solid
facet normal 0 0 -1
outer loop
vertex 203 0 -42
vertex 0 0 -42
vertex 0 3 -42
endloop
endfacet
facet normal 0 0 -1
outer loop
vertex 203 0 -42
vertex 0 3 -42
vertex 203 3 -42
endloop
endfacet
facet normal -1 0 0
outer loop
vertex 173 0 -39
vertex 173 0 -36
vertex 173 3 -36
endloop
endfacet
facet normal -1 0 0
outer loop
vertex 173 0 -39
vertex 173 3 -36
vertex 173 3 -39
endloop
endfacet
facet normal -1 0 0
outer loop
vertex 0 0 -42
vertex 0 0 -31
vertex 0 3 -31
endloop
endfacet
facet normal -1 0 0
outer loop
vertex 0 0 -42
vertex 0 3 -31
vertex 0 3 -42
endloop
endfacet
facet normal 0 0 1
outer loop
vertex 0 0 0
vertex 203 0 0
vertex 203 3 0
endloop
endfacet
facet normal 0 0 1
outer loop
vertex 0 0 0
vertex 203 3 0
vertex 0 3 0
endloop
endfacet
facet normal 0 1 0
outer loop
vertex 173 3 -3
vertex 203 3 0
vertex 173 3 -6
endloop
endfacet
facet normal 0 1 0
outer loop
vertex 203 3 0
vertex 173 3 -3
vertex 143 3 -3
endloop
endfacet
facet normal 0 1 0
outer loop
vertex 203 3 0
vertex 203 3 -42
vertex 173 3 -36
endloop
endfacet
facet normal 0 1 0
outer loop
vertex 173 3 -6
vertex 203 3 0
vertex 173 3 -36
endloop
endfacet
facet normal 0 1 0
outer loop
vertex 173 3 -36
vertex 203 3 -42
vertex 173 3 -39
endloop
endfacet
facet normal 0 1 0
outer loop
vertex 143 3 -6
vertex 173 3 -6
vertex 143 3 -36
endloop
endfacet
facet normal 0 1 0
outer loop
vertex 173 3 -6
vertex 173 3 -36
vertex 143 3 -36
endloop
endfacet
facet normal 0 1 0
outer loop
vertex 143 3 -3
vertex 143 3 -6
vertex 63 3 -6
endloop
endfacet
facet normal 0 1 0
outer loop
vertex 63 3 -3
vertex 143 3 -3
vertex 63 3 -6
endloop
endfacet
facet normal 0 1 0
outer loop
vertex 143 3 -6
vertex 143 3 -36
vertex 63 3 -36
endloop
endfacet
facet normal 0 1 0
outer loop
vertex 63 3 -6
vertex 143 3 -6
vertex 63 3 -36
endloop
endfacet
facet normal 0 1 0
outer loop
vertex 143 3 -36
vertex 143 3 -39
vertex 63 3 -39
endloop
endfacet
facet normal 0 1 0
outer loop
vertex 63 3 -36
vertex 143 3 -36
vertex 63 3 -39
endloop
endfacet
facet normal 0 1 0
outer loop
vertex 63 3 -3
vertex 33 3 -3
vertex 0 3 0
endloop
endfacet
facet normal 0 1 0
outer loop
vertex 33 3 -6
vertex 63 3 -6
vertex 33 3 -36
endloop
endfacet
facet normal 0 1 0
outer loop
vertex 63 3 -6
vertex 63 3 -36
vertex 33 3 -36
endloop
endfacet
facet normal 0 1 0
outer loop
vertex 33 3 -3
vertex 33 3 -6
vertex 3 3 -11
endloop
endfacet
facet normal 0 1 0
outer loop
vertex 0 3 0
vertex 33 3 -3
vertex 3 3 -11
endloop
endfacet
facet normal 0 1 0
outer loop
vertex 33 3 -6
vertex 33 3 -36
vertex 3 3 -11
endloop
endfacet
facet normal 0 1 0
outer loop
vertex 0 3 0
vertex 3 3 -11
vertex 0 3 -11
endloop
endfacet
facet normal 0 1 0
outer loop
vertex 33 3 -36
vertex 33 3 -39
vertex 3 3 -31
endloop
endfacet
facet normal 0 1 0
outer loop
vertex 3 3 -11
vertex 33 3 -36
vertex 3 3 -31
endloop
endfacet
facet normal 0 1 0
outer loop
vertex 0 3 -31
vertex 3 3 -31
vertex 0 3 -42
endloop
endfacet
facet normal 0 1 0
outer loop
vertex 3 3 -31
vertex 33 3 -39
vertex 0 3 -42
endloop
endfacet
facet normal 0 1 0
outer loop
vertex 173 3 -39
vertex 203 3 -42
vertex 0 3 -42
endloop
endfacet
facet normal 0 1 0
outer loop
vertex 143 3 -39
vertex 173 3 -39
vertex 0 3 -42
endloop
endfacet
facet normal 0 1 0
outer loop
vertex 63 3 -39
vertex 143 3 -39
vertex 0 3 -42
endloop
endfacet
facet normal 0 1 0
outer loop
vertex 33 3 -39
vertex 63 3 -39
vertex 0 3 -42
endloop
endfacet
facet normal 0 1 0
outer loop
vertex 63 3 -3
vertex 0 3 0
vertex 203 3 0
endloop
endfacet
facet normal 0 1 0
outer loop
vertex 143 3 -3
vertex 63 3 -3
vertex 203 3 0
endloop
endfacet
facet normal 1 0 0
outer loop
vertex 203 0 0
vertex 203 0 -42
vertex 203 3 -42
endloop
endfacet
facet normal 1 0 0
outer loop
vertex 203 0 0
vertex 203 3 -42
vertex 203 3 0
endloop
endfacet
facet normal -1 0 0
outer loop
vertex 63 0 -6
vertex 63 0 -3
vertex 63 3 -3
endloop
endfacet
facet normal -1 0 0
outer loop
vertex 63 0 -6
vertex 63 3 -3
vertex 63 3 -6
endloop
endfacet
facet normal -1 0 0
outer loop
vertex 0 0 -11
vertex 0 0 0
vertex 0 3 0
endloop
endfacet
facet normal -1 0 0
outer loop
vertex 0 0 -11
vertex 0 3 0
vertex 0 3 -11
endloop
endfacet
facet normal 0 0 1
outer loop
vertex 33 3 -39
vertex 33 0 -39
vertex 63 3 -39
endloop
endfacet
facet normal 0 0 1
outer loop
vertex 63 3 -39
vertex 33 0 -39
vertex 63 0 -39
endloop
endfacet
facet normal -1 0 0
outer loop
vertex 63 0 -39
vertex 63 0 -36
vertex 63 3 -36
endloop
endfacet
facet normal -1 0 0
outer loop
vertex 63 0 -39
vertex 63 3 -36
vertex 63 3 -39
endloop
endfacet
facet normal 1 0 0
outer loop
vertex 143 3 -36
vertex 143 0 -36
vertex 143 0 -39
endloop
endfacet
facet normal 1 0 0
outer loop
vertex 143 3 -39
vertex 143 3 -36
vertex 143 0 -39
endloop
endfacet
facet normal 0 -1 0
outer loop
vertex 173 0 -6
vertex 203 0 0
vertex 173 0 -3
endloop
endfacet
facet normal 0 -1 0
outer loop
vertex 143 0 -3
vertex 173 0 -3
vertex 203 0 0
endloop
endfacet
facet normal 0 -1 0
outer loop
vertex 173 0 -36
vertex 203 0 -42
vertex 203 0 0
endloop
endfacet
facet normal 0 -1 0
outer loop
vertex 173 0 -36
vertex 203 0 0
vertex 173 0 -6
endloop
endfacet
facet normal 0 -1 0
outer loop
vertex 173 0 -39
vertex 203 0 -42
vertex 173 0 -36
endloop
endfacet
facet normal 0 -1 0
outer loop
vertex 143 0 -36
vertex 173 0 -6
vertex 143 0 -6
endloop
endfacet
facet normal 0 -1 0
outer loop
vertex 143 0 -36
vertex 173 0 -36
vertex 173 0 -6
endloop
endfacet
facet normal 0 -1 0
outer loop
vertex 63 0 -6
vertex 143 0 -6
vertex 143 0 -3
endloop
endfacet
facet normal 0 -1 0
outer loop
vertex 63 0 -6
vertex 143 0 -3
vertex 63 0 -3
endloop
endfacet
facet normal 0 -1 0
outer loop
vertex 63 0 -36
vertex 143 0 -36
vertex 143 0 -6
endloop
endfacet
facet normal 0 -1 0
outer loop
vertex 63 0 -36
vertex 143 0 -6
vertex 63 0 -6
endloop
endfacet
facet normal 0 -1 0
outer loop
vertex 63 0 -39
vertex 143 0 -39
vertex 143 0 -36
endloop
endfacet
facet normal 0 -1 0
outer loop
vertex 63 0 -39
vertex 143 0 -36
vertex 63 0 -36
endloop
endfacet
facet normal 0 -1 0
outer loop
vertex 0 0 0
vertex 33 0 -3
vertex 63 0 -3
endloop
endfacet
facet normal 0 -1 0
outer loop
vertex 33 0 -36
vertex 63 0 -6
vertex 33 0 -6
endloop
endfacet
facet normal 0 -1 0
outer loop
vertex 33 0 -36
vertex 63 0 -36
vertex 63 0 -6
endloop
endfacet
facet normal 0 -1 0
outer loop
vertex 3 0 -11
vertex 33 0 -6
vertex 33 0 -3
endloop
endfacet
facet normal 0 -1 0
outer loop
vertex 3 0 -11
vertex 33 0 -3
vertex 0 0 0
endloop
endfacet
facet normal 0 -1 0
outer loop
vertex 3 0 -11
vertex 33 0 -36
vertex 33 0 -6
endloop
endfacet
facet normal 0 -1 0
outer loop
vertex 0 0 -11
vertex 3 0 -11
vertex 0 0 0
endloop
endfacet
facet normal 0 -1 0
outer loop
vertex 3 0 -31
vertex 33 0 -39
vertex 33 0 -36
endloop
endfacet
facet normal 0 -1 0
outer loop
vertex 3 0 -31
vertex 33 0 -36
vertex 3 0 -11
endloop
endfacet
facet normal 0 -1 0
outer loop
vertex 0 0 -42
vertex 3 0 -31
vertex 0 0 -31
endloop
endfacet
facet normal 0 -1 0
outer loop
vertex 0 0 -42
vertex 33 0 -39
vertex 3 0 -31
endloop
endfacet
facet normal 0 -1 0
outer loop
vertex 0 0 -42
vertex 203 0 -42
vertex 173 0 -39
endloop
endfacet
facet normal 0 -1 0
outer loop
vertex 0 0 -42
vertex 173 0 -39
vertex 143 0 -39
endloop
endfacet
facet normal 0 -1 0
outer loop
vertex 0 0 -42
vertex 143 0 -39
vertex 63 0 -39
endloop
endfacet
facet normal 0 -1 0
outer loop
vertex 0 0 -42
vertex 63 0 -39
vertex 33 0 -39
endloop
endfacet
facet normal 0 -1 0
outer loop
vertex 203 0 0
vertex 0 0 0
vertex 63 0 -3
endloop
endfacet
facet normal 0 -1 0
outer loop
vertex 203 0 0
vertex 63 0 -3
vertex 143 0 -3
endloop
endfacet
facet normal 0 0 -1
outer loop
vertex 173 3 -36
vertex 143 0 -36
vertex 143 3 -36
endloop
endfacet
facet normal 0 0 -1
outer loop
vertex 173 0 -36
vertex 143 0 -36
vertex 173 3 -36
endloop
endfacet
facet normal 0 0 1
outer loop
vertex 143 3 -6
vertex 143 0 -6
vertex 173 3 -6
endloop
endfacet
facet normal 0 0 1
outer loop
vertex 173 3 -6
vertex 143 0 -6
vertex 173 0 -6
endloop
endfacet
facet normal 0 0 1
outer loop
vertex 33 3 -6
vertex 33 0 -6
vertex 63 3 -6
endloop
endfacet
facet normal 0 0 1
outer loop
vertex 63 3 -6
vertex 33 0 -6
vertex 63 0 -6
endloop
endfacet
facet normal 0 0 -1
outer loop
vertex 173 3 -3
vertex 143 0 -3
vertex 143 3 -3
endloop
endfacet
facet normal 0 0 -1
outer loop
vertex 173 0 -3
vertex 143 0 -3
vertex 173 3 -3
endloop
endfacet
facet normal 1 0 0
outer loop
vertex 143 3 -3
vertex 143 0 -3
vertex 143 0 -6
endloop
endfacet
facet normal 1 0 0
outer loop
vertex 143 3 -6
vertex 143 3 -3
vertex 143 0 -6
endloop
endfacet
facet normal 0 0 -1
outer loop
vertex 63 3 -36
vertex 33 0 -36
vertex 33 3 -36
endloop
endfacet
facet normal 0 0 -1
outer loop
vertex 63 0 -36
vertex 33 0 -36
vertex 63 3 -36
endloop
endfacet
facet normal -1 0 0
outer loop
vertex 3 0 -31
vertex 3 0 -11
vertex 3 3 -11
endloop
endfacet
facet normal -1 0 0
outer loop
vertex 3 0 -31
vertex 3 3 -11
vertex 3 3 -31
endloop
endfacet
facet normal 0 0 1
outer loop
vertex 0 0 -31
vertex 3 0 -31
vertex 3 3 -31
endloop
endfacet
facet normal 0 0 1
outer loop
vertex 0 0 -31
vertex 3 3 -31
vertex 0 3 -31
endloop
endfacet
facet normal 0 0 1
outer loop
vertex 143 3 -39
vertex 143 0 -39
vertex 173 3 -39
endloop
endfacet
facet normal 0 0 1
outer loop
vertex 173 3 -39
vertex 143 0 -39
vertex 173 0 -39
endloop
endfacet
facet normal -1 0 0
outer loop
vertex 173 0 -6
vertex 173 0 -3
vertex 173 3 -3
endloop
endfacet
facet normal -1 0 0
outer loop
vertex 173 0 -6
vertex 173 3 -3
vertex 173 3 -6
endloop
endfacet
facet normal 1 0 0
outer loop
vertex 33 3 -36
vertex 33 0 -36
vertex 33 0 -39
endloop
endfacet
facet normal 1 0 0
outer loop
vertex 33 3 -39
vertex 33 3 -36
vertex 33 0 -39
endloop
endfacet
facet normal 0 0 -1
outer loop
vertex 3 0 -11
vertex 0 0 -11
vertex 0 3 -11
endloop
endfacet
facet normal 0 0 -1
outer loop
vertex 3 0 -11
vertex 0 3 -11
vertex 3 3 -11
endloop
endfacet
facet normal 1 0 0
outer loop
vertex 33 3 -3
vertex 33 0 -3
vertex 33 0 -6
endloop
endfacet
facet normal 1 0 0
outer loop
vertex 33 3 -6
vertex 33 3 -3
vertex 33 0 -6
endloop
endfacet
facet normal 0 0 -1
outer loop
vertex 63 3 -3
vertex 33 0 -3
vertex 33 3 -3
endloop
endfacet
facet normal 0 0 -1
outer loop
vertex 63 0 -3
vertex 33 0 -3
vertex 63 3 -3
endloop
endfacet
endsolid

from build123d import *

# Parameters (mm, degrees)
SKETCH1_W           = 30
SKETCH1_H           = 3
BOSS_EXTRUDE1_DEPTH = 3


with BuildPart() as part:
    # Sketch1 → Boss-Extrude1 (new body)
    with BuildSketch(Plane(origin=(0, 0, 0), x_dir=(1, 0, 0), z_dir=(0, 1, 0))):
        Polygon((0, 31), (0, 42), (203, 42), (203, 0), (0, 0), (0, 11), (3, 11), (3, 31), align=None)
        with Locations((48, 4.5)):
            Rectangle(SKETCH1_W, SKETCH1_H, mode=Mode.SUBTRACT)
        with Locations((158, 4.5)):
            Rectangle(SKETCH1_W, SKETCH1_H, mode=Mode.SUBTRACT)
        with Locations((158, 37.5)):
            Rectangle(SKETCH1_W, SKETCH1_H, mode=Mode.SUBTRACT)
        with Locations((48, 37.5)):
            Rectangle(SKETCH1_W, SKETCH1_H, mode=Mode.SUBTRACT)
    extrude(amount=BOSS_EXTRUDE1_DEPTH)


solid = part.part
